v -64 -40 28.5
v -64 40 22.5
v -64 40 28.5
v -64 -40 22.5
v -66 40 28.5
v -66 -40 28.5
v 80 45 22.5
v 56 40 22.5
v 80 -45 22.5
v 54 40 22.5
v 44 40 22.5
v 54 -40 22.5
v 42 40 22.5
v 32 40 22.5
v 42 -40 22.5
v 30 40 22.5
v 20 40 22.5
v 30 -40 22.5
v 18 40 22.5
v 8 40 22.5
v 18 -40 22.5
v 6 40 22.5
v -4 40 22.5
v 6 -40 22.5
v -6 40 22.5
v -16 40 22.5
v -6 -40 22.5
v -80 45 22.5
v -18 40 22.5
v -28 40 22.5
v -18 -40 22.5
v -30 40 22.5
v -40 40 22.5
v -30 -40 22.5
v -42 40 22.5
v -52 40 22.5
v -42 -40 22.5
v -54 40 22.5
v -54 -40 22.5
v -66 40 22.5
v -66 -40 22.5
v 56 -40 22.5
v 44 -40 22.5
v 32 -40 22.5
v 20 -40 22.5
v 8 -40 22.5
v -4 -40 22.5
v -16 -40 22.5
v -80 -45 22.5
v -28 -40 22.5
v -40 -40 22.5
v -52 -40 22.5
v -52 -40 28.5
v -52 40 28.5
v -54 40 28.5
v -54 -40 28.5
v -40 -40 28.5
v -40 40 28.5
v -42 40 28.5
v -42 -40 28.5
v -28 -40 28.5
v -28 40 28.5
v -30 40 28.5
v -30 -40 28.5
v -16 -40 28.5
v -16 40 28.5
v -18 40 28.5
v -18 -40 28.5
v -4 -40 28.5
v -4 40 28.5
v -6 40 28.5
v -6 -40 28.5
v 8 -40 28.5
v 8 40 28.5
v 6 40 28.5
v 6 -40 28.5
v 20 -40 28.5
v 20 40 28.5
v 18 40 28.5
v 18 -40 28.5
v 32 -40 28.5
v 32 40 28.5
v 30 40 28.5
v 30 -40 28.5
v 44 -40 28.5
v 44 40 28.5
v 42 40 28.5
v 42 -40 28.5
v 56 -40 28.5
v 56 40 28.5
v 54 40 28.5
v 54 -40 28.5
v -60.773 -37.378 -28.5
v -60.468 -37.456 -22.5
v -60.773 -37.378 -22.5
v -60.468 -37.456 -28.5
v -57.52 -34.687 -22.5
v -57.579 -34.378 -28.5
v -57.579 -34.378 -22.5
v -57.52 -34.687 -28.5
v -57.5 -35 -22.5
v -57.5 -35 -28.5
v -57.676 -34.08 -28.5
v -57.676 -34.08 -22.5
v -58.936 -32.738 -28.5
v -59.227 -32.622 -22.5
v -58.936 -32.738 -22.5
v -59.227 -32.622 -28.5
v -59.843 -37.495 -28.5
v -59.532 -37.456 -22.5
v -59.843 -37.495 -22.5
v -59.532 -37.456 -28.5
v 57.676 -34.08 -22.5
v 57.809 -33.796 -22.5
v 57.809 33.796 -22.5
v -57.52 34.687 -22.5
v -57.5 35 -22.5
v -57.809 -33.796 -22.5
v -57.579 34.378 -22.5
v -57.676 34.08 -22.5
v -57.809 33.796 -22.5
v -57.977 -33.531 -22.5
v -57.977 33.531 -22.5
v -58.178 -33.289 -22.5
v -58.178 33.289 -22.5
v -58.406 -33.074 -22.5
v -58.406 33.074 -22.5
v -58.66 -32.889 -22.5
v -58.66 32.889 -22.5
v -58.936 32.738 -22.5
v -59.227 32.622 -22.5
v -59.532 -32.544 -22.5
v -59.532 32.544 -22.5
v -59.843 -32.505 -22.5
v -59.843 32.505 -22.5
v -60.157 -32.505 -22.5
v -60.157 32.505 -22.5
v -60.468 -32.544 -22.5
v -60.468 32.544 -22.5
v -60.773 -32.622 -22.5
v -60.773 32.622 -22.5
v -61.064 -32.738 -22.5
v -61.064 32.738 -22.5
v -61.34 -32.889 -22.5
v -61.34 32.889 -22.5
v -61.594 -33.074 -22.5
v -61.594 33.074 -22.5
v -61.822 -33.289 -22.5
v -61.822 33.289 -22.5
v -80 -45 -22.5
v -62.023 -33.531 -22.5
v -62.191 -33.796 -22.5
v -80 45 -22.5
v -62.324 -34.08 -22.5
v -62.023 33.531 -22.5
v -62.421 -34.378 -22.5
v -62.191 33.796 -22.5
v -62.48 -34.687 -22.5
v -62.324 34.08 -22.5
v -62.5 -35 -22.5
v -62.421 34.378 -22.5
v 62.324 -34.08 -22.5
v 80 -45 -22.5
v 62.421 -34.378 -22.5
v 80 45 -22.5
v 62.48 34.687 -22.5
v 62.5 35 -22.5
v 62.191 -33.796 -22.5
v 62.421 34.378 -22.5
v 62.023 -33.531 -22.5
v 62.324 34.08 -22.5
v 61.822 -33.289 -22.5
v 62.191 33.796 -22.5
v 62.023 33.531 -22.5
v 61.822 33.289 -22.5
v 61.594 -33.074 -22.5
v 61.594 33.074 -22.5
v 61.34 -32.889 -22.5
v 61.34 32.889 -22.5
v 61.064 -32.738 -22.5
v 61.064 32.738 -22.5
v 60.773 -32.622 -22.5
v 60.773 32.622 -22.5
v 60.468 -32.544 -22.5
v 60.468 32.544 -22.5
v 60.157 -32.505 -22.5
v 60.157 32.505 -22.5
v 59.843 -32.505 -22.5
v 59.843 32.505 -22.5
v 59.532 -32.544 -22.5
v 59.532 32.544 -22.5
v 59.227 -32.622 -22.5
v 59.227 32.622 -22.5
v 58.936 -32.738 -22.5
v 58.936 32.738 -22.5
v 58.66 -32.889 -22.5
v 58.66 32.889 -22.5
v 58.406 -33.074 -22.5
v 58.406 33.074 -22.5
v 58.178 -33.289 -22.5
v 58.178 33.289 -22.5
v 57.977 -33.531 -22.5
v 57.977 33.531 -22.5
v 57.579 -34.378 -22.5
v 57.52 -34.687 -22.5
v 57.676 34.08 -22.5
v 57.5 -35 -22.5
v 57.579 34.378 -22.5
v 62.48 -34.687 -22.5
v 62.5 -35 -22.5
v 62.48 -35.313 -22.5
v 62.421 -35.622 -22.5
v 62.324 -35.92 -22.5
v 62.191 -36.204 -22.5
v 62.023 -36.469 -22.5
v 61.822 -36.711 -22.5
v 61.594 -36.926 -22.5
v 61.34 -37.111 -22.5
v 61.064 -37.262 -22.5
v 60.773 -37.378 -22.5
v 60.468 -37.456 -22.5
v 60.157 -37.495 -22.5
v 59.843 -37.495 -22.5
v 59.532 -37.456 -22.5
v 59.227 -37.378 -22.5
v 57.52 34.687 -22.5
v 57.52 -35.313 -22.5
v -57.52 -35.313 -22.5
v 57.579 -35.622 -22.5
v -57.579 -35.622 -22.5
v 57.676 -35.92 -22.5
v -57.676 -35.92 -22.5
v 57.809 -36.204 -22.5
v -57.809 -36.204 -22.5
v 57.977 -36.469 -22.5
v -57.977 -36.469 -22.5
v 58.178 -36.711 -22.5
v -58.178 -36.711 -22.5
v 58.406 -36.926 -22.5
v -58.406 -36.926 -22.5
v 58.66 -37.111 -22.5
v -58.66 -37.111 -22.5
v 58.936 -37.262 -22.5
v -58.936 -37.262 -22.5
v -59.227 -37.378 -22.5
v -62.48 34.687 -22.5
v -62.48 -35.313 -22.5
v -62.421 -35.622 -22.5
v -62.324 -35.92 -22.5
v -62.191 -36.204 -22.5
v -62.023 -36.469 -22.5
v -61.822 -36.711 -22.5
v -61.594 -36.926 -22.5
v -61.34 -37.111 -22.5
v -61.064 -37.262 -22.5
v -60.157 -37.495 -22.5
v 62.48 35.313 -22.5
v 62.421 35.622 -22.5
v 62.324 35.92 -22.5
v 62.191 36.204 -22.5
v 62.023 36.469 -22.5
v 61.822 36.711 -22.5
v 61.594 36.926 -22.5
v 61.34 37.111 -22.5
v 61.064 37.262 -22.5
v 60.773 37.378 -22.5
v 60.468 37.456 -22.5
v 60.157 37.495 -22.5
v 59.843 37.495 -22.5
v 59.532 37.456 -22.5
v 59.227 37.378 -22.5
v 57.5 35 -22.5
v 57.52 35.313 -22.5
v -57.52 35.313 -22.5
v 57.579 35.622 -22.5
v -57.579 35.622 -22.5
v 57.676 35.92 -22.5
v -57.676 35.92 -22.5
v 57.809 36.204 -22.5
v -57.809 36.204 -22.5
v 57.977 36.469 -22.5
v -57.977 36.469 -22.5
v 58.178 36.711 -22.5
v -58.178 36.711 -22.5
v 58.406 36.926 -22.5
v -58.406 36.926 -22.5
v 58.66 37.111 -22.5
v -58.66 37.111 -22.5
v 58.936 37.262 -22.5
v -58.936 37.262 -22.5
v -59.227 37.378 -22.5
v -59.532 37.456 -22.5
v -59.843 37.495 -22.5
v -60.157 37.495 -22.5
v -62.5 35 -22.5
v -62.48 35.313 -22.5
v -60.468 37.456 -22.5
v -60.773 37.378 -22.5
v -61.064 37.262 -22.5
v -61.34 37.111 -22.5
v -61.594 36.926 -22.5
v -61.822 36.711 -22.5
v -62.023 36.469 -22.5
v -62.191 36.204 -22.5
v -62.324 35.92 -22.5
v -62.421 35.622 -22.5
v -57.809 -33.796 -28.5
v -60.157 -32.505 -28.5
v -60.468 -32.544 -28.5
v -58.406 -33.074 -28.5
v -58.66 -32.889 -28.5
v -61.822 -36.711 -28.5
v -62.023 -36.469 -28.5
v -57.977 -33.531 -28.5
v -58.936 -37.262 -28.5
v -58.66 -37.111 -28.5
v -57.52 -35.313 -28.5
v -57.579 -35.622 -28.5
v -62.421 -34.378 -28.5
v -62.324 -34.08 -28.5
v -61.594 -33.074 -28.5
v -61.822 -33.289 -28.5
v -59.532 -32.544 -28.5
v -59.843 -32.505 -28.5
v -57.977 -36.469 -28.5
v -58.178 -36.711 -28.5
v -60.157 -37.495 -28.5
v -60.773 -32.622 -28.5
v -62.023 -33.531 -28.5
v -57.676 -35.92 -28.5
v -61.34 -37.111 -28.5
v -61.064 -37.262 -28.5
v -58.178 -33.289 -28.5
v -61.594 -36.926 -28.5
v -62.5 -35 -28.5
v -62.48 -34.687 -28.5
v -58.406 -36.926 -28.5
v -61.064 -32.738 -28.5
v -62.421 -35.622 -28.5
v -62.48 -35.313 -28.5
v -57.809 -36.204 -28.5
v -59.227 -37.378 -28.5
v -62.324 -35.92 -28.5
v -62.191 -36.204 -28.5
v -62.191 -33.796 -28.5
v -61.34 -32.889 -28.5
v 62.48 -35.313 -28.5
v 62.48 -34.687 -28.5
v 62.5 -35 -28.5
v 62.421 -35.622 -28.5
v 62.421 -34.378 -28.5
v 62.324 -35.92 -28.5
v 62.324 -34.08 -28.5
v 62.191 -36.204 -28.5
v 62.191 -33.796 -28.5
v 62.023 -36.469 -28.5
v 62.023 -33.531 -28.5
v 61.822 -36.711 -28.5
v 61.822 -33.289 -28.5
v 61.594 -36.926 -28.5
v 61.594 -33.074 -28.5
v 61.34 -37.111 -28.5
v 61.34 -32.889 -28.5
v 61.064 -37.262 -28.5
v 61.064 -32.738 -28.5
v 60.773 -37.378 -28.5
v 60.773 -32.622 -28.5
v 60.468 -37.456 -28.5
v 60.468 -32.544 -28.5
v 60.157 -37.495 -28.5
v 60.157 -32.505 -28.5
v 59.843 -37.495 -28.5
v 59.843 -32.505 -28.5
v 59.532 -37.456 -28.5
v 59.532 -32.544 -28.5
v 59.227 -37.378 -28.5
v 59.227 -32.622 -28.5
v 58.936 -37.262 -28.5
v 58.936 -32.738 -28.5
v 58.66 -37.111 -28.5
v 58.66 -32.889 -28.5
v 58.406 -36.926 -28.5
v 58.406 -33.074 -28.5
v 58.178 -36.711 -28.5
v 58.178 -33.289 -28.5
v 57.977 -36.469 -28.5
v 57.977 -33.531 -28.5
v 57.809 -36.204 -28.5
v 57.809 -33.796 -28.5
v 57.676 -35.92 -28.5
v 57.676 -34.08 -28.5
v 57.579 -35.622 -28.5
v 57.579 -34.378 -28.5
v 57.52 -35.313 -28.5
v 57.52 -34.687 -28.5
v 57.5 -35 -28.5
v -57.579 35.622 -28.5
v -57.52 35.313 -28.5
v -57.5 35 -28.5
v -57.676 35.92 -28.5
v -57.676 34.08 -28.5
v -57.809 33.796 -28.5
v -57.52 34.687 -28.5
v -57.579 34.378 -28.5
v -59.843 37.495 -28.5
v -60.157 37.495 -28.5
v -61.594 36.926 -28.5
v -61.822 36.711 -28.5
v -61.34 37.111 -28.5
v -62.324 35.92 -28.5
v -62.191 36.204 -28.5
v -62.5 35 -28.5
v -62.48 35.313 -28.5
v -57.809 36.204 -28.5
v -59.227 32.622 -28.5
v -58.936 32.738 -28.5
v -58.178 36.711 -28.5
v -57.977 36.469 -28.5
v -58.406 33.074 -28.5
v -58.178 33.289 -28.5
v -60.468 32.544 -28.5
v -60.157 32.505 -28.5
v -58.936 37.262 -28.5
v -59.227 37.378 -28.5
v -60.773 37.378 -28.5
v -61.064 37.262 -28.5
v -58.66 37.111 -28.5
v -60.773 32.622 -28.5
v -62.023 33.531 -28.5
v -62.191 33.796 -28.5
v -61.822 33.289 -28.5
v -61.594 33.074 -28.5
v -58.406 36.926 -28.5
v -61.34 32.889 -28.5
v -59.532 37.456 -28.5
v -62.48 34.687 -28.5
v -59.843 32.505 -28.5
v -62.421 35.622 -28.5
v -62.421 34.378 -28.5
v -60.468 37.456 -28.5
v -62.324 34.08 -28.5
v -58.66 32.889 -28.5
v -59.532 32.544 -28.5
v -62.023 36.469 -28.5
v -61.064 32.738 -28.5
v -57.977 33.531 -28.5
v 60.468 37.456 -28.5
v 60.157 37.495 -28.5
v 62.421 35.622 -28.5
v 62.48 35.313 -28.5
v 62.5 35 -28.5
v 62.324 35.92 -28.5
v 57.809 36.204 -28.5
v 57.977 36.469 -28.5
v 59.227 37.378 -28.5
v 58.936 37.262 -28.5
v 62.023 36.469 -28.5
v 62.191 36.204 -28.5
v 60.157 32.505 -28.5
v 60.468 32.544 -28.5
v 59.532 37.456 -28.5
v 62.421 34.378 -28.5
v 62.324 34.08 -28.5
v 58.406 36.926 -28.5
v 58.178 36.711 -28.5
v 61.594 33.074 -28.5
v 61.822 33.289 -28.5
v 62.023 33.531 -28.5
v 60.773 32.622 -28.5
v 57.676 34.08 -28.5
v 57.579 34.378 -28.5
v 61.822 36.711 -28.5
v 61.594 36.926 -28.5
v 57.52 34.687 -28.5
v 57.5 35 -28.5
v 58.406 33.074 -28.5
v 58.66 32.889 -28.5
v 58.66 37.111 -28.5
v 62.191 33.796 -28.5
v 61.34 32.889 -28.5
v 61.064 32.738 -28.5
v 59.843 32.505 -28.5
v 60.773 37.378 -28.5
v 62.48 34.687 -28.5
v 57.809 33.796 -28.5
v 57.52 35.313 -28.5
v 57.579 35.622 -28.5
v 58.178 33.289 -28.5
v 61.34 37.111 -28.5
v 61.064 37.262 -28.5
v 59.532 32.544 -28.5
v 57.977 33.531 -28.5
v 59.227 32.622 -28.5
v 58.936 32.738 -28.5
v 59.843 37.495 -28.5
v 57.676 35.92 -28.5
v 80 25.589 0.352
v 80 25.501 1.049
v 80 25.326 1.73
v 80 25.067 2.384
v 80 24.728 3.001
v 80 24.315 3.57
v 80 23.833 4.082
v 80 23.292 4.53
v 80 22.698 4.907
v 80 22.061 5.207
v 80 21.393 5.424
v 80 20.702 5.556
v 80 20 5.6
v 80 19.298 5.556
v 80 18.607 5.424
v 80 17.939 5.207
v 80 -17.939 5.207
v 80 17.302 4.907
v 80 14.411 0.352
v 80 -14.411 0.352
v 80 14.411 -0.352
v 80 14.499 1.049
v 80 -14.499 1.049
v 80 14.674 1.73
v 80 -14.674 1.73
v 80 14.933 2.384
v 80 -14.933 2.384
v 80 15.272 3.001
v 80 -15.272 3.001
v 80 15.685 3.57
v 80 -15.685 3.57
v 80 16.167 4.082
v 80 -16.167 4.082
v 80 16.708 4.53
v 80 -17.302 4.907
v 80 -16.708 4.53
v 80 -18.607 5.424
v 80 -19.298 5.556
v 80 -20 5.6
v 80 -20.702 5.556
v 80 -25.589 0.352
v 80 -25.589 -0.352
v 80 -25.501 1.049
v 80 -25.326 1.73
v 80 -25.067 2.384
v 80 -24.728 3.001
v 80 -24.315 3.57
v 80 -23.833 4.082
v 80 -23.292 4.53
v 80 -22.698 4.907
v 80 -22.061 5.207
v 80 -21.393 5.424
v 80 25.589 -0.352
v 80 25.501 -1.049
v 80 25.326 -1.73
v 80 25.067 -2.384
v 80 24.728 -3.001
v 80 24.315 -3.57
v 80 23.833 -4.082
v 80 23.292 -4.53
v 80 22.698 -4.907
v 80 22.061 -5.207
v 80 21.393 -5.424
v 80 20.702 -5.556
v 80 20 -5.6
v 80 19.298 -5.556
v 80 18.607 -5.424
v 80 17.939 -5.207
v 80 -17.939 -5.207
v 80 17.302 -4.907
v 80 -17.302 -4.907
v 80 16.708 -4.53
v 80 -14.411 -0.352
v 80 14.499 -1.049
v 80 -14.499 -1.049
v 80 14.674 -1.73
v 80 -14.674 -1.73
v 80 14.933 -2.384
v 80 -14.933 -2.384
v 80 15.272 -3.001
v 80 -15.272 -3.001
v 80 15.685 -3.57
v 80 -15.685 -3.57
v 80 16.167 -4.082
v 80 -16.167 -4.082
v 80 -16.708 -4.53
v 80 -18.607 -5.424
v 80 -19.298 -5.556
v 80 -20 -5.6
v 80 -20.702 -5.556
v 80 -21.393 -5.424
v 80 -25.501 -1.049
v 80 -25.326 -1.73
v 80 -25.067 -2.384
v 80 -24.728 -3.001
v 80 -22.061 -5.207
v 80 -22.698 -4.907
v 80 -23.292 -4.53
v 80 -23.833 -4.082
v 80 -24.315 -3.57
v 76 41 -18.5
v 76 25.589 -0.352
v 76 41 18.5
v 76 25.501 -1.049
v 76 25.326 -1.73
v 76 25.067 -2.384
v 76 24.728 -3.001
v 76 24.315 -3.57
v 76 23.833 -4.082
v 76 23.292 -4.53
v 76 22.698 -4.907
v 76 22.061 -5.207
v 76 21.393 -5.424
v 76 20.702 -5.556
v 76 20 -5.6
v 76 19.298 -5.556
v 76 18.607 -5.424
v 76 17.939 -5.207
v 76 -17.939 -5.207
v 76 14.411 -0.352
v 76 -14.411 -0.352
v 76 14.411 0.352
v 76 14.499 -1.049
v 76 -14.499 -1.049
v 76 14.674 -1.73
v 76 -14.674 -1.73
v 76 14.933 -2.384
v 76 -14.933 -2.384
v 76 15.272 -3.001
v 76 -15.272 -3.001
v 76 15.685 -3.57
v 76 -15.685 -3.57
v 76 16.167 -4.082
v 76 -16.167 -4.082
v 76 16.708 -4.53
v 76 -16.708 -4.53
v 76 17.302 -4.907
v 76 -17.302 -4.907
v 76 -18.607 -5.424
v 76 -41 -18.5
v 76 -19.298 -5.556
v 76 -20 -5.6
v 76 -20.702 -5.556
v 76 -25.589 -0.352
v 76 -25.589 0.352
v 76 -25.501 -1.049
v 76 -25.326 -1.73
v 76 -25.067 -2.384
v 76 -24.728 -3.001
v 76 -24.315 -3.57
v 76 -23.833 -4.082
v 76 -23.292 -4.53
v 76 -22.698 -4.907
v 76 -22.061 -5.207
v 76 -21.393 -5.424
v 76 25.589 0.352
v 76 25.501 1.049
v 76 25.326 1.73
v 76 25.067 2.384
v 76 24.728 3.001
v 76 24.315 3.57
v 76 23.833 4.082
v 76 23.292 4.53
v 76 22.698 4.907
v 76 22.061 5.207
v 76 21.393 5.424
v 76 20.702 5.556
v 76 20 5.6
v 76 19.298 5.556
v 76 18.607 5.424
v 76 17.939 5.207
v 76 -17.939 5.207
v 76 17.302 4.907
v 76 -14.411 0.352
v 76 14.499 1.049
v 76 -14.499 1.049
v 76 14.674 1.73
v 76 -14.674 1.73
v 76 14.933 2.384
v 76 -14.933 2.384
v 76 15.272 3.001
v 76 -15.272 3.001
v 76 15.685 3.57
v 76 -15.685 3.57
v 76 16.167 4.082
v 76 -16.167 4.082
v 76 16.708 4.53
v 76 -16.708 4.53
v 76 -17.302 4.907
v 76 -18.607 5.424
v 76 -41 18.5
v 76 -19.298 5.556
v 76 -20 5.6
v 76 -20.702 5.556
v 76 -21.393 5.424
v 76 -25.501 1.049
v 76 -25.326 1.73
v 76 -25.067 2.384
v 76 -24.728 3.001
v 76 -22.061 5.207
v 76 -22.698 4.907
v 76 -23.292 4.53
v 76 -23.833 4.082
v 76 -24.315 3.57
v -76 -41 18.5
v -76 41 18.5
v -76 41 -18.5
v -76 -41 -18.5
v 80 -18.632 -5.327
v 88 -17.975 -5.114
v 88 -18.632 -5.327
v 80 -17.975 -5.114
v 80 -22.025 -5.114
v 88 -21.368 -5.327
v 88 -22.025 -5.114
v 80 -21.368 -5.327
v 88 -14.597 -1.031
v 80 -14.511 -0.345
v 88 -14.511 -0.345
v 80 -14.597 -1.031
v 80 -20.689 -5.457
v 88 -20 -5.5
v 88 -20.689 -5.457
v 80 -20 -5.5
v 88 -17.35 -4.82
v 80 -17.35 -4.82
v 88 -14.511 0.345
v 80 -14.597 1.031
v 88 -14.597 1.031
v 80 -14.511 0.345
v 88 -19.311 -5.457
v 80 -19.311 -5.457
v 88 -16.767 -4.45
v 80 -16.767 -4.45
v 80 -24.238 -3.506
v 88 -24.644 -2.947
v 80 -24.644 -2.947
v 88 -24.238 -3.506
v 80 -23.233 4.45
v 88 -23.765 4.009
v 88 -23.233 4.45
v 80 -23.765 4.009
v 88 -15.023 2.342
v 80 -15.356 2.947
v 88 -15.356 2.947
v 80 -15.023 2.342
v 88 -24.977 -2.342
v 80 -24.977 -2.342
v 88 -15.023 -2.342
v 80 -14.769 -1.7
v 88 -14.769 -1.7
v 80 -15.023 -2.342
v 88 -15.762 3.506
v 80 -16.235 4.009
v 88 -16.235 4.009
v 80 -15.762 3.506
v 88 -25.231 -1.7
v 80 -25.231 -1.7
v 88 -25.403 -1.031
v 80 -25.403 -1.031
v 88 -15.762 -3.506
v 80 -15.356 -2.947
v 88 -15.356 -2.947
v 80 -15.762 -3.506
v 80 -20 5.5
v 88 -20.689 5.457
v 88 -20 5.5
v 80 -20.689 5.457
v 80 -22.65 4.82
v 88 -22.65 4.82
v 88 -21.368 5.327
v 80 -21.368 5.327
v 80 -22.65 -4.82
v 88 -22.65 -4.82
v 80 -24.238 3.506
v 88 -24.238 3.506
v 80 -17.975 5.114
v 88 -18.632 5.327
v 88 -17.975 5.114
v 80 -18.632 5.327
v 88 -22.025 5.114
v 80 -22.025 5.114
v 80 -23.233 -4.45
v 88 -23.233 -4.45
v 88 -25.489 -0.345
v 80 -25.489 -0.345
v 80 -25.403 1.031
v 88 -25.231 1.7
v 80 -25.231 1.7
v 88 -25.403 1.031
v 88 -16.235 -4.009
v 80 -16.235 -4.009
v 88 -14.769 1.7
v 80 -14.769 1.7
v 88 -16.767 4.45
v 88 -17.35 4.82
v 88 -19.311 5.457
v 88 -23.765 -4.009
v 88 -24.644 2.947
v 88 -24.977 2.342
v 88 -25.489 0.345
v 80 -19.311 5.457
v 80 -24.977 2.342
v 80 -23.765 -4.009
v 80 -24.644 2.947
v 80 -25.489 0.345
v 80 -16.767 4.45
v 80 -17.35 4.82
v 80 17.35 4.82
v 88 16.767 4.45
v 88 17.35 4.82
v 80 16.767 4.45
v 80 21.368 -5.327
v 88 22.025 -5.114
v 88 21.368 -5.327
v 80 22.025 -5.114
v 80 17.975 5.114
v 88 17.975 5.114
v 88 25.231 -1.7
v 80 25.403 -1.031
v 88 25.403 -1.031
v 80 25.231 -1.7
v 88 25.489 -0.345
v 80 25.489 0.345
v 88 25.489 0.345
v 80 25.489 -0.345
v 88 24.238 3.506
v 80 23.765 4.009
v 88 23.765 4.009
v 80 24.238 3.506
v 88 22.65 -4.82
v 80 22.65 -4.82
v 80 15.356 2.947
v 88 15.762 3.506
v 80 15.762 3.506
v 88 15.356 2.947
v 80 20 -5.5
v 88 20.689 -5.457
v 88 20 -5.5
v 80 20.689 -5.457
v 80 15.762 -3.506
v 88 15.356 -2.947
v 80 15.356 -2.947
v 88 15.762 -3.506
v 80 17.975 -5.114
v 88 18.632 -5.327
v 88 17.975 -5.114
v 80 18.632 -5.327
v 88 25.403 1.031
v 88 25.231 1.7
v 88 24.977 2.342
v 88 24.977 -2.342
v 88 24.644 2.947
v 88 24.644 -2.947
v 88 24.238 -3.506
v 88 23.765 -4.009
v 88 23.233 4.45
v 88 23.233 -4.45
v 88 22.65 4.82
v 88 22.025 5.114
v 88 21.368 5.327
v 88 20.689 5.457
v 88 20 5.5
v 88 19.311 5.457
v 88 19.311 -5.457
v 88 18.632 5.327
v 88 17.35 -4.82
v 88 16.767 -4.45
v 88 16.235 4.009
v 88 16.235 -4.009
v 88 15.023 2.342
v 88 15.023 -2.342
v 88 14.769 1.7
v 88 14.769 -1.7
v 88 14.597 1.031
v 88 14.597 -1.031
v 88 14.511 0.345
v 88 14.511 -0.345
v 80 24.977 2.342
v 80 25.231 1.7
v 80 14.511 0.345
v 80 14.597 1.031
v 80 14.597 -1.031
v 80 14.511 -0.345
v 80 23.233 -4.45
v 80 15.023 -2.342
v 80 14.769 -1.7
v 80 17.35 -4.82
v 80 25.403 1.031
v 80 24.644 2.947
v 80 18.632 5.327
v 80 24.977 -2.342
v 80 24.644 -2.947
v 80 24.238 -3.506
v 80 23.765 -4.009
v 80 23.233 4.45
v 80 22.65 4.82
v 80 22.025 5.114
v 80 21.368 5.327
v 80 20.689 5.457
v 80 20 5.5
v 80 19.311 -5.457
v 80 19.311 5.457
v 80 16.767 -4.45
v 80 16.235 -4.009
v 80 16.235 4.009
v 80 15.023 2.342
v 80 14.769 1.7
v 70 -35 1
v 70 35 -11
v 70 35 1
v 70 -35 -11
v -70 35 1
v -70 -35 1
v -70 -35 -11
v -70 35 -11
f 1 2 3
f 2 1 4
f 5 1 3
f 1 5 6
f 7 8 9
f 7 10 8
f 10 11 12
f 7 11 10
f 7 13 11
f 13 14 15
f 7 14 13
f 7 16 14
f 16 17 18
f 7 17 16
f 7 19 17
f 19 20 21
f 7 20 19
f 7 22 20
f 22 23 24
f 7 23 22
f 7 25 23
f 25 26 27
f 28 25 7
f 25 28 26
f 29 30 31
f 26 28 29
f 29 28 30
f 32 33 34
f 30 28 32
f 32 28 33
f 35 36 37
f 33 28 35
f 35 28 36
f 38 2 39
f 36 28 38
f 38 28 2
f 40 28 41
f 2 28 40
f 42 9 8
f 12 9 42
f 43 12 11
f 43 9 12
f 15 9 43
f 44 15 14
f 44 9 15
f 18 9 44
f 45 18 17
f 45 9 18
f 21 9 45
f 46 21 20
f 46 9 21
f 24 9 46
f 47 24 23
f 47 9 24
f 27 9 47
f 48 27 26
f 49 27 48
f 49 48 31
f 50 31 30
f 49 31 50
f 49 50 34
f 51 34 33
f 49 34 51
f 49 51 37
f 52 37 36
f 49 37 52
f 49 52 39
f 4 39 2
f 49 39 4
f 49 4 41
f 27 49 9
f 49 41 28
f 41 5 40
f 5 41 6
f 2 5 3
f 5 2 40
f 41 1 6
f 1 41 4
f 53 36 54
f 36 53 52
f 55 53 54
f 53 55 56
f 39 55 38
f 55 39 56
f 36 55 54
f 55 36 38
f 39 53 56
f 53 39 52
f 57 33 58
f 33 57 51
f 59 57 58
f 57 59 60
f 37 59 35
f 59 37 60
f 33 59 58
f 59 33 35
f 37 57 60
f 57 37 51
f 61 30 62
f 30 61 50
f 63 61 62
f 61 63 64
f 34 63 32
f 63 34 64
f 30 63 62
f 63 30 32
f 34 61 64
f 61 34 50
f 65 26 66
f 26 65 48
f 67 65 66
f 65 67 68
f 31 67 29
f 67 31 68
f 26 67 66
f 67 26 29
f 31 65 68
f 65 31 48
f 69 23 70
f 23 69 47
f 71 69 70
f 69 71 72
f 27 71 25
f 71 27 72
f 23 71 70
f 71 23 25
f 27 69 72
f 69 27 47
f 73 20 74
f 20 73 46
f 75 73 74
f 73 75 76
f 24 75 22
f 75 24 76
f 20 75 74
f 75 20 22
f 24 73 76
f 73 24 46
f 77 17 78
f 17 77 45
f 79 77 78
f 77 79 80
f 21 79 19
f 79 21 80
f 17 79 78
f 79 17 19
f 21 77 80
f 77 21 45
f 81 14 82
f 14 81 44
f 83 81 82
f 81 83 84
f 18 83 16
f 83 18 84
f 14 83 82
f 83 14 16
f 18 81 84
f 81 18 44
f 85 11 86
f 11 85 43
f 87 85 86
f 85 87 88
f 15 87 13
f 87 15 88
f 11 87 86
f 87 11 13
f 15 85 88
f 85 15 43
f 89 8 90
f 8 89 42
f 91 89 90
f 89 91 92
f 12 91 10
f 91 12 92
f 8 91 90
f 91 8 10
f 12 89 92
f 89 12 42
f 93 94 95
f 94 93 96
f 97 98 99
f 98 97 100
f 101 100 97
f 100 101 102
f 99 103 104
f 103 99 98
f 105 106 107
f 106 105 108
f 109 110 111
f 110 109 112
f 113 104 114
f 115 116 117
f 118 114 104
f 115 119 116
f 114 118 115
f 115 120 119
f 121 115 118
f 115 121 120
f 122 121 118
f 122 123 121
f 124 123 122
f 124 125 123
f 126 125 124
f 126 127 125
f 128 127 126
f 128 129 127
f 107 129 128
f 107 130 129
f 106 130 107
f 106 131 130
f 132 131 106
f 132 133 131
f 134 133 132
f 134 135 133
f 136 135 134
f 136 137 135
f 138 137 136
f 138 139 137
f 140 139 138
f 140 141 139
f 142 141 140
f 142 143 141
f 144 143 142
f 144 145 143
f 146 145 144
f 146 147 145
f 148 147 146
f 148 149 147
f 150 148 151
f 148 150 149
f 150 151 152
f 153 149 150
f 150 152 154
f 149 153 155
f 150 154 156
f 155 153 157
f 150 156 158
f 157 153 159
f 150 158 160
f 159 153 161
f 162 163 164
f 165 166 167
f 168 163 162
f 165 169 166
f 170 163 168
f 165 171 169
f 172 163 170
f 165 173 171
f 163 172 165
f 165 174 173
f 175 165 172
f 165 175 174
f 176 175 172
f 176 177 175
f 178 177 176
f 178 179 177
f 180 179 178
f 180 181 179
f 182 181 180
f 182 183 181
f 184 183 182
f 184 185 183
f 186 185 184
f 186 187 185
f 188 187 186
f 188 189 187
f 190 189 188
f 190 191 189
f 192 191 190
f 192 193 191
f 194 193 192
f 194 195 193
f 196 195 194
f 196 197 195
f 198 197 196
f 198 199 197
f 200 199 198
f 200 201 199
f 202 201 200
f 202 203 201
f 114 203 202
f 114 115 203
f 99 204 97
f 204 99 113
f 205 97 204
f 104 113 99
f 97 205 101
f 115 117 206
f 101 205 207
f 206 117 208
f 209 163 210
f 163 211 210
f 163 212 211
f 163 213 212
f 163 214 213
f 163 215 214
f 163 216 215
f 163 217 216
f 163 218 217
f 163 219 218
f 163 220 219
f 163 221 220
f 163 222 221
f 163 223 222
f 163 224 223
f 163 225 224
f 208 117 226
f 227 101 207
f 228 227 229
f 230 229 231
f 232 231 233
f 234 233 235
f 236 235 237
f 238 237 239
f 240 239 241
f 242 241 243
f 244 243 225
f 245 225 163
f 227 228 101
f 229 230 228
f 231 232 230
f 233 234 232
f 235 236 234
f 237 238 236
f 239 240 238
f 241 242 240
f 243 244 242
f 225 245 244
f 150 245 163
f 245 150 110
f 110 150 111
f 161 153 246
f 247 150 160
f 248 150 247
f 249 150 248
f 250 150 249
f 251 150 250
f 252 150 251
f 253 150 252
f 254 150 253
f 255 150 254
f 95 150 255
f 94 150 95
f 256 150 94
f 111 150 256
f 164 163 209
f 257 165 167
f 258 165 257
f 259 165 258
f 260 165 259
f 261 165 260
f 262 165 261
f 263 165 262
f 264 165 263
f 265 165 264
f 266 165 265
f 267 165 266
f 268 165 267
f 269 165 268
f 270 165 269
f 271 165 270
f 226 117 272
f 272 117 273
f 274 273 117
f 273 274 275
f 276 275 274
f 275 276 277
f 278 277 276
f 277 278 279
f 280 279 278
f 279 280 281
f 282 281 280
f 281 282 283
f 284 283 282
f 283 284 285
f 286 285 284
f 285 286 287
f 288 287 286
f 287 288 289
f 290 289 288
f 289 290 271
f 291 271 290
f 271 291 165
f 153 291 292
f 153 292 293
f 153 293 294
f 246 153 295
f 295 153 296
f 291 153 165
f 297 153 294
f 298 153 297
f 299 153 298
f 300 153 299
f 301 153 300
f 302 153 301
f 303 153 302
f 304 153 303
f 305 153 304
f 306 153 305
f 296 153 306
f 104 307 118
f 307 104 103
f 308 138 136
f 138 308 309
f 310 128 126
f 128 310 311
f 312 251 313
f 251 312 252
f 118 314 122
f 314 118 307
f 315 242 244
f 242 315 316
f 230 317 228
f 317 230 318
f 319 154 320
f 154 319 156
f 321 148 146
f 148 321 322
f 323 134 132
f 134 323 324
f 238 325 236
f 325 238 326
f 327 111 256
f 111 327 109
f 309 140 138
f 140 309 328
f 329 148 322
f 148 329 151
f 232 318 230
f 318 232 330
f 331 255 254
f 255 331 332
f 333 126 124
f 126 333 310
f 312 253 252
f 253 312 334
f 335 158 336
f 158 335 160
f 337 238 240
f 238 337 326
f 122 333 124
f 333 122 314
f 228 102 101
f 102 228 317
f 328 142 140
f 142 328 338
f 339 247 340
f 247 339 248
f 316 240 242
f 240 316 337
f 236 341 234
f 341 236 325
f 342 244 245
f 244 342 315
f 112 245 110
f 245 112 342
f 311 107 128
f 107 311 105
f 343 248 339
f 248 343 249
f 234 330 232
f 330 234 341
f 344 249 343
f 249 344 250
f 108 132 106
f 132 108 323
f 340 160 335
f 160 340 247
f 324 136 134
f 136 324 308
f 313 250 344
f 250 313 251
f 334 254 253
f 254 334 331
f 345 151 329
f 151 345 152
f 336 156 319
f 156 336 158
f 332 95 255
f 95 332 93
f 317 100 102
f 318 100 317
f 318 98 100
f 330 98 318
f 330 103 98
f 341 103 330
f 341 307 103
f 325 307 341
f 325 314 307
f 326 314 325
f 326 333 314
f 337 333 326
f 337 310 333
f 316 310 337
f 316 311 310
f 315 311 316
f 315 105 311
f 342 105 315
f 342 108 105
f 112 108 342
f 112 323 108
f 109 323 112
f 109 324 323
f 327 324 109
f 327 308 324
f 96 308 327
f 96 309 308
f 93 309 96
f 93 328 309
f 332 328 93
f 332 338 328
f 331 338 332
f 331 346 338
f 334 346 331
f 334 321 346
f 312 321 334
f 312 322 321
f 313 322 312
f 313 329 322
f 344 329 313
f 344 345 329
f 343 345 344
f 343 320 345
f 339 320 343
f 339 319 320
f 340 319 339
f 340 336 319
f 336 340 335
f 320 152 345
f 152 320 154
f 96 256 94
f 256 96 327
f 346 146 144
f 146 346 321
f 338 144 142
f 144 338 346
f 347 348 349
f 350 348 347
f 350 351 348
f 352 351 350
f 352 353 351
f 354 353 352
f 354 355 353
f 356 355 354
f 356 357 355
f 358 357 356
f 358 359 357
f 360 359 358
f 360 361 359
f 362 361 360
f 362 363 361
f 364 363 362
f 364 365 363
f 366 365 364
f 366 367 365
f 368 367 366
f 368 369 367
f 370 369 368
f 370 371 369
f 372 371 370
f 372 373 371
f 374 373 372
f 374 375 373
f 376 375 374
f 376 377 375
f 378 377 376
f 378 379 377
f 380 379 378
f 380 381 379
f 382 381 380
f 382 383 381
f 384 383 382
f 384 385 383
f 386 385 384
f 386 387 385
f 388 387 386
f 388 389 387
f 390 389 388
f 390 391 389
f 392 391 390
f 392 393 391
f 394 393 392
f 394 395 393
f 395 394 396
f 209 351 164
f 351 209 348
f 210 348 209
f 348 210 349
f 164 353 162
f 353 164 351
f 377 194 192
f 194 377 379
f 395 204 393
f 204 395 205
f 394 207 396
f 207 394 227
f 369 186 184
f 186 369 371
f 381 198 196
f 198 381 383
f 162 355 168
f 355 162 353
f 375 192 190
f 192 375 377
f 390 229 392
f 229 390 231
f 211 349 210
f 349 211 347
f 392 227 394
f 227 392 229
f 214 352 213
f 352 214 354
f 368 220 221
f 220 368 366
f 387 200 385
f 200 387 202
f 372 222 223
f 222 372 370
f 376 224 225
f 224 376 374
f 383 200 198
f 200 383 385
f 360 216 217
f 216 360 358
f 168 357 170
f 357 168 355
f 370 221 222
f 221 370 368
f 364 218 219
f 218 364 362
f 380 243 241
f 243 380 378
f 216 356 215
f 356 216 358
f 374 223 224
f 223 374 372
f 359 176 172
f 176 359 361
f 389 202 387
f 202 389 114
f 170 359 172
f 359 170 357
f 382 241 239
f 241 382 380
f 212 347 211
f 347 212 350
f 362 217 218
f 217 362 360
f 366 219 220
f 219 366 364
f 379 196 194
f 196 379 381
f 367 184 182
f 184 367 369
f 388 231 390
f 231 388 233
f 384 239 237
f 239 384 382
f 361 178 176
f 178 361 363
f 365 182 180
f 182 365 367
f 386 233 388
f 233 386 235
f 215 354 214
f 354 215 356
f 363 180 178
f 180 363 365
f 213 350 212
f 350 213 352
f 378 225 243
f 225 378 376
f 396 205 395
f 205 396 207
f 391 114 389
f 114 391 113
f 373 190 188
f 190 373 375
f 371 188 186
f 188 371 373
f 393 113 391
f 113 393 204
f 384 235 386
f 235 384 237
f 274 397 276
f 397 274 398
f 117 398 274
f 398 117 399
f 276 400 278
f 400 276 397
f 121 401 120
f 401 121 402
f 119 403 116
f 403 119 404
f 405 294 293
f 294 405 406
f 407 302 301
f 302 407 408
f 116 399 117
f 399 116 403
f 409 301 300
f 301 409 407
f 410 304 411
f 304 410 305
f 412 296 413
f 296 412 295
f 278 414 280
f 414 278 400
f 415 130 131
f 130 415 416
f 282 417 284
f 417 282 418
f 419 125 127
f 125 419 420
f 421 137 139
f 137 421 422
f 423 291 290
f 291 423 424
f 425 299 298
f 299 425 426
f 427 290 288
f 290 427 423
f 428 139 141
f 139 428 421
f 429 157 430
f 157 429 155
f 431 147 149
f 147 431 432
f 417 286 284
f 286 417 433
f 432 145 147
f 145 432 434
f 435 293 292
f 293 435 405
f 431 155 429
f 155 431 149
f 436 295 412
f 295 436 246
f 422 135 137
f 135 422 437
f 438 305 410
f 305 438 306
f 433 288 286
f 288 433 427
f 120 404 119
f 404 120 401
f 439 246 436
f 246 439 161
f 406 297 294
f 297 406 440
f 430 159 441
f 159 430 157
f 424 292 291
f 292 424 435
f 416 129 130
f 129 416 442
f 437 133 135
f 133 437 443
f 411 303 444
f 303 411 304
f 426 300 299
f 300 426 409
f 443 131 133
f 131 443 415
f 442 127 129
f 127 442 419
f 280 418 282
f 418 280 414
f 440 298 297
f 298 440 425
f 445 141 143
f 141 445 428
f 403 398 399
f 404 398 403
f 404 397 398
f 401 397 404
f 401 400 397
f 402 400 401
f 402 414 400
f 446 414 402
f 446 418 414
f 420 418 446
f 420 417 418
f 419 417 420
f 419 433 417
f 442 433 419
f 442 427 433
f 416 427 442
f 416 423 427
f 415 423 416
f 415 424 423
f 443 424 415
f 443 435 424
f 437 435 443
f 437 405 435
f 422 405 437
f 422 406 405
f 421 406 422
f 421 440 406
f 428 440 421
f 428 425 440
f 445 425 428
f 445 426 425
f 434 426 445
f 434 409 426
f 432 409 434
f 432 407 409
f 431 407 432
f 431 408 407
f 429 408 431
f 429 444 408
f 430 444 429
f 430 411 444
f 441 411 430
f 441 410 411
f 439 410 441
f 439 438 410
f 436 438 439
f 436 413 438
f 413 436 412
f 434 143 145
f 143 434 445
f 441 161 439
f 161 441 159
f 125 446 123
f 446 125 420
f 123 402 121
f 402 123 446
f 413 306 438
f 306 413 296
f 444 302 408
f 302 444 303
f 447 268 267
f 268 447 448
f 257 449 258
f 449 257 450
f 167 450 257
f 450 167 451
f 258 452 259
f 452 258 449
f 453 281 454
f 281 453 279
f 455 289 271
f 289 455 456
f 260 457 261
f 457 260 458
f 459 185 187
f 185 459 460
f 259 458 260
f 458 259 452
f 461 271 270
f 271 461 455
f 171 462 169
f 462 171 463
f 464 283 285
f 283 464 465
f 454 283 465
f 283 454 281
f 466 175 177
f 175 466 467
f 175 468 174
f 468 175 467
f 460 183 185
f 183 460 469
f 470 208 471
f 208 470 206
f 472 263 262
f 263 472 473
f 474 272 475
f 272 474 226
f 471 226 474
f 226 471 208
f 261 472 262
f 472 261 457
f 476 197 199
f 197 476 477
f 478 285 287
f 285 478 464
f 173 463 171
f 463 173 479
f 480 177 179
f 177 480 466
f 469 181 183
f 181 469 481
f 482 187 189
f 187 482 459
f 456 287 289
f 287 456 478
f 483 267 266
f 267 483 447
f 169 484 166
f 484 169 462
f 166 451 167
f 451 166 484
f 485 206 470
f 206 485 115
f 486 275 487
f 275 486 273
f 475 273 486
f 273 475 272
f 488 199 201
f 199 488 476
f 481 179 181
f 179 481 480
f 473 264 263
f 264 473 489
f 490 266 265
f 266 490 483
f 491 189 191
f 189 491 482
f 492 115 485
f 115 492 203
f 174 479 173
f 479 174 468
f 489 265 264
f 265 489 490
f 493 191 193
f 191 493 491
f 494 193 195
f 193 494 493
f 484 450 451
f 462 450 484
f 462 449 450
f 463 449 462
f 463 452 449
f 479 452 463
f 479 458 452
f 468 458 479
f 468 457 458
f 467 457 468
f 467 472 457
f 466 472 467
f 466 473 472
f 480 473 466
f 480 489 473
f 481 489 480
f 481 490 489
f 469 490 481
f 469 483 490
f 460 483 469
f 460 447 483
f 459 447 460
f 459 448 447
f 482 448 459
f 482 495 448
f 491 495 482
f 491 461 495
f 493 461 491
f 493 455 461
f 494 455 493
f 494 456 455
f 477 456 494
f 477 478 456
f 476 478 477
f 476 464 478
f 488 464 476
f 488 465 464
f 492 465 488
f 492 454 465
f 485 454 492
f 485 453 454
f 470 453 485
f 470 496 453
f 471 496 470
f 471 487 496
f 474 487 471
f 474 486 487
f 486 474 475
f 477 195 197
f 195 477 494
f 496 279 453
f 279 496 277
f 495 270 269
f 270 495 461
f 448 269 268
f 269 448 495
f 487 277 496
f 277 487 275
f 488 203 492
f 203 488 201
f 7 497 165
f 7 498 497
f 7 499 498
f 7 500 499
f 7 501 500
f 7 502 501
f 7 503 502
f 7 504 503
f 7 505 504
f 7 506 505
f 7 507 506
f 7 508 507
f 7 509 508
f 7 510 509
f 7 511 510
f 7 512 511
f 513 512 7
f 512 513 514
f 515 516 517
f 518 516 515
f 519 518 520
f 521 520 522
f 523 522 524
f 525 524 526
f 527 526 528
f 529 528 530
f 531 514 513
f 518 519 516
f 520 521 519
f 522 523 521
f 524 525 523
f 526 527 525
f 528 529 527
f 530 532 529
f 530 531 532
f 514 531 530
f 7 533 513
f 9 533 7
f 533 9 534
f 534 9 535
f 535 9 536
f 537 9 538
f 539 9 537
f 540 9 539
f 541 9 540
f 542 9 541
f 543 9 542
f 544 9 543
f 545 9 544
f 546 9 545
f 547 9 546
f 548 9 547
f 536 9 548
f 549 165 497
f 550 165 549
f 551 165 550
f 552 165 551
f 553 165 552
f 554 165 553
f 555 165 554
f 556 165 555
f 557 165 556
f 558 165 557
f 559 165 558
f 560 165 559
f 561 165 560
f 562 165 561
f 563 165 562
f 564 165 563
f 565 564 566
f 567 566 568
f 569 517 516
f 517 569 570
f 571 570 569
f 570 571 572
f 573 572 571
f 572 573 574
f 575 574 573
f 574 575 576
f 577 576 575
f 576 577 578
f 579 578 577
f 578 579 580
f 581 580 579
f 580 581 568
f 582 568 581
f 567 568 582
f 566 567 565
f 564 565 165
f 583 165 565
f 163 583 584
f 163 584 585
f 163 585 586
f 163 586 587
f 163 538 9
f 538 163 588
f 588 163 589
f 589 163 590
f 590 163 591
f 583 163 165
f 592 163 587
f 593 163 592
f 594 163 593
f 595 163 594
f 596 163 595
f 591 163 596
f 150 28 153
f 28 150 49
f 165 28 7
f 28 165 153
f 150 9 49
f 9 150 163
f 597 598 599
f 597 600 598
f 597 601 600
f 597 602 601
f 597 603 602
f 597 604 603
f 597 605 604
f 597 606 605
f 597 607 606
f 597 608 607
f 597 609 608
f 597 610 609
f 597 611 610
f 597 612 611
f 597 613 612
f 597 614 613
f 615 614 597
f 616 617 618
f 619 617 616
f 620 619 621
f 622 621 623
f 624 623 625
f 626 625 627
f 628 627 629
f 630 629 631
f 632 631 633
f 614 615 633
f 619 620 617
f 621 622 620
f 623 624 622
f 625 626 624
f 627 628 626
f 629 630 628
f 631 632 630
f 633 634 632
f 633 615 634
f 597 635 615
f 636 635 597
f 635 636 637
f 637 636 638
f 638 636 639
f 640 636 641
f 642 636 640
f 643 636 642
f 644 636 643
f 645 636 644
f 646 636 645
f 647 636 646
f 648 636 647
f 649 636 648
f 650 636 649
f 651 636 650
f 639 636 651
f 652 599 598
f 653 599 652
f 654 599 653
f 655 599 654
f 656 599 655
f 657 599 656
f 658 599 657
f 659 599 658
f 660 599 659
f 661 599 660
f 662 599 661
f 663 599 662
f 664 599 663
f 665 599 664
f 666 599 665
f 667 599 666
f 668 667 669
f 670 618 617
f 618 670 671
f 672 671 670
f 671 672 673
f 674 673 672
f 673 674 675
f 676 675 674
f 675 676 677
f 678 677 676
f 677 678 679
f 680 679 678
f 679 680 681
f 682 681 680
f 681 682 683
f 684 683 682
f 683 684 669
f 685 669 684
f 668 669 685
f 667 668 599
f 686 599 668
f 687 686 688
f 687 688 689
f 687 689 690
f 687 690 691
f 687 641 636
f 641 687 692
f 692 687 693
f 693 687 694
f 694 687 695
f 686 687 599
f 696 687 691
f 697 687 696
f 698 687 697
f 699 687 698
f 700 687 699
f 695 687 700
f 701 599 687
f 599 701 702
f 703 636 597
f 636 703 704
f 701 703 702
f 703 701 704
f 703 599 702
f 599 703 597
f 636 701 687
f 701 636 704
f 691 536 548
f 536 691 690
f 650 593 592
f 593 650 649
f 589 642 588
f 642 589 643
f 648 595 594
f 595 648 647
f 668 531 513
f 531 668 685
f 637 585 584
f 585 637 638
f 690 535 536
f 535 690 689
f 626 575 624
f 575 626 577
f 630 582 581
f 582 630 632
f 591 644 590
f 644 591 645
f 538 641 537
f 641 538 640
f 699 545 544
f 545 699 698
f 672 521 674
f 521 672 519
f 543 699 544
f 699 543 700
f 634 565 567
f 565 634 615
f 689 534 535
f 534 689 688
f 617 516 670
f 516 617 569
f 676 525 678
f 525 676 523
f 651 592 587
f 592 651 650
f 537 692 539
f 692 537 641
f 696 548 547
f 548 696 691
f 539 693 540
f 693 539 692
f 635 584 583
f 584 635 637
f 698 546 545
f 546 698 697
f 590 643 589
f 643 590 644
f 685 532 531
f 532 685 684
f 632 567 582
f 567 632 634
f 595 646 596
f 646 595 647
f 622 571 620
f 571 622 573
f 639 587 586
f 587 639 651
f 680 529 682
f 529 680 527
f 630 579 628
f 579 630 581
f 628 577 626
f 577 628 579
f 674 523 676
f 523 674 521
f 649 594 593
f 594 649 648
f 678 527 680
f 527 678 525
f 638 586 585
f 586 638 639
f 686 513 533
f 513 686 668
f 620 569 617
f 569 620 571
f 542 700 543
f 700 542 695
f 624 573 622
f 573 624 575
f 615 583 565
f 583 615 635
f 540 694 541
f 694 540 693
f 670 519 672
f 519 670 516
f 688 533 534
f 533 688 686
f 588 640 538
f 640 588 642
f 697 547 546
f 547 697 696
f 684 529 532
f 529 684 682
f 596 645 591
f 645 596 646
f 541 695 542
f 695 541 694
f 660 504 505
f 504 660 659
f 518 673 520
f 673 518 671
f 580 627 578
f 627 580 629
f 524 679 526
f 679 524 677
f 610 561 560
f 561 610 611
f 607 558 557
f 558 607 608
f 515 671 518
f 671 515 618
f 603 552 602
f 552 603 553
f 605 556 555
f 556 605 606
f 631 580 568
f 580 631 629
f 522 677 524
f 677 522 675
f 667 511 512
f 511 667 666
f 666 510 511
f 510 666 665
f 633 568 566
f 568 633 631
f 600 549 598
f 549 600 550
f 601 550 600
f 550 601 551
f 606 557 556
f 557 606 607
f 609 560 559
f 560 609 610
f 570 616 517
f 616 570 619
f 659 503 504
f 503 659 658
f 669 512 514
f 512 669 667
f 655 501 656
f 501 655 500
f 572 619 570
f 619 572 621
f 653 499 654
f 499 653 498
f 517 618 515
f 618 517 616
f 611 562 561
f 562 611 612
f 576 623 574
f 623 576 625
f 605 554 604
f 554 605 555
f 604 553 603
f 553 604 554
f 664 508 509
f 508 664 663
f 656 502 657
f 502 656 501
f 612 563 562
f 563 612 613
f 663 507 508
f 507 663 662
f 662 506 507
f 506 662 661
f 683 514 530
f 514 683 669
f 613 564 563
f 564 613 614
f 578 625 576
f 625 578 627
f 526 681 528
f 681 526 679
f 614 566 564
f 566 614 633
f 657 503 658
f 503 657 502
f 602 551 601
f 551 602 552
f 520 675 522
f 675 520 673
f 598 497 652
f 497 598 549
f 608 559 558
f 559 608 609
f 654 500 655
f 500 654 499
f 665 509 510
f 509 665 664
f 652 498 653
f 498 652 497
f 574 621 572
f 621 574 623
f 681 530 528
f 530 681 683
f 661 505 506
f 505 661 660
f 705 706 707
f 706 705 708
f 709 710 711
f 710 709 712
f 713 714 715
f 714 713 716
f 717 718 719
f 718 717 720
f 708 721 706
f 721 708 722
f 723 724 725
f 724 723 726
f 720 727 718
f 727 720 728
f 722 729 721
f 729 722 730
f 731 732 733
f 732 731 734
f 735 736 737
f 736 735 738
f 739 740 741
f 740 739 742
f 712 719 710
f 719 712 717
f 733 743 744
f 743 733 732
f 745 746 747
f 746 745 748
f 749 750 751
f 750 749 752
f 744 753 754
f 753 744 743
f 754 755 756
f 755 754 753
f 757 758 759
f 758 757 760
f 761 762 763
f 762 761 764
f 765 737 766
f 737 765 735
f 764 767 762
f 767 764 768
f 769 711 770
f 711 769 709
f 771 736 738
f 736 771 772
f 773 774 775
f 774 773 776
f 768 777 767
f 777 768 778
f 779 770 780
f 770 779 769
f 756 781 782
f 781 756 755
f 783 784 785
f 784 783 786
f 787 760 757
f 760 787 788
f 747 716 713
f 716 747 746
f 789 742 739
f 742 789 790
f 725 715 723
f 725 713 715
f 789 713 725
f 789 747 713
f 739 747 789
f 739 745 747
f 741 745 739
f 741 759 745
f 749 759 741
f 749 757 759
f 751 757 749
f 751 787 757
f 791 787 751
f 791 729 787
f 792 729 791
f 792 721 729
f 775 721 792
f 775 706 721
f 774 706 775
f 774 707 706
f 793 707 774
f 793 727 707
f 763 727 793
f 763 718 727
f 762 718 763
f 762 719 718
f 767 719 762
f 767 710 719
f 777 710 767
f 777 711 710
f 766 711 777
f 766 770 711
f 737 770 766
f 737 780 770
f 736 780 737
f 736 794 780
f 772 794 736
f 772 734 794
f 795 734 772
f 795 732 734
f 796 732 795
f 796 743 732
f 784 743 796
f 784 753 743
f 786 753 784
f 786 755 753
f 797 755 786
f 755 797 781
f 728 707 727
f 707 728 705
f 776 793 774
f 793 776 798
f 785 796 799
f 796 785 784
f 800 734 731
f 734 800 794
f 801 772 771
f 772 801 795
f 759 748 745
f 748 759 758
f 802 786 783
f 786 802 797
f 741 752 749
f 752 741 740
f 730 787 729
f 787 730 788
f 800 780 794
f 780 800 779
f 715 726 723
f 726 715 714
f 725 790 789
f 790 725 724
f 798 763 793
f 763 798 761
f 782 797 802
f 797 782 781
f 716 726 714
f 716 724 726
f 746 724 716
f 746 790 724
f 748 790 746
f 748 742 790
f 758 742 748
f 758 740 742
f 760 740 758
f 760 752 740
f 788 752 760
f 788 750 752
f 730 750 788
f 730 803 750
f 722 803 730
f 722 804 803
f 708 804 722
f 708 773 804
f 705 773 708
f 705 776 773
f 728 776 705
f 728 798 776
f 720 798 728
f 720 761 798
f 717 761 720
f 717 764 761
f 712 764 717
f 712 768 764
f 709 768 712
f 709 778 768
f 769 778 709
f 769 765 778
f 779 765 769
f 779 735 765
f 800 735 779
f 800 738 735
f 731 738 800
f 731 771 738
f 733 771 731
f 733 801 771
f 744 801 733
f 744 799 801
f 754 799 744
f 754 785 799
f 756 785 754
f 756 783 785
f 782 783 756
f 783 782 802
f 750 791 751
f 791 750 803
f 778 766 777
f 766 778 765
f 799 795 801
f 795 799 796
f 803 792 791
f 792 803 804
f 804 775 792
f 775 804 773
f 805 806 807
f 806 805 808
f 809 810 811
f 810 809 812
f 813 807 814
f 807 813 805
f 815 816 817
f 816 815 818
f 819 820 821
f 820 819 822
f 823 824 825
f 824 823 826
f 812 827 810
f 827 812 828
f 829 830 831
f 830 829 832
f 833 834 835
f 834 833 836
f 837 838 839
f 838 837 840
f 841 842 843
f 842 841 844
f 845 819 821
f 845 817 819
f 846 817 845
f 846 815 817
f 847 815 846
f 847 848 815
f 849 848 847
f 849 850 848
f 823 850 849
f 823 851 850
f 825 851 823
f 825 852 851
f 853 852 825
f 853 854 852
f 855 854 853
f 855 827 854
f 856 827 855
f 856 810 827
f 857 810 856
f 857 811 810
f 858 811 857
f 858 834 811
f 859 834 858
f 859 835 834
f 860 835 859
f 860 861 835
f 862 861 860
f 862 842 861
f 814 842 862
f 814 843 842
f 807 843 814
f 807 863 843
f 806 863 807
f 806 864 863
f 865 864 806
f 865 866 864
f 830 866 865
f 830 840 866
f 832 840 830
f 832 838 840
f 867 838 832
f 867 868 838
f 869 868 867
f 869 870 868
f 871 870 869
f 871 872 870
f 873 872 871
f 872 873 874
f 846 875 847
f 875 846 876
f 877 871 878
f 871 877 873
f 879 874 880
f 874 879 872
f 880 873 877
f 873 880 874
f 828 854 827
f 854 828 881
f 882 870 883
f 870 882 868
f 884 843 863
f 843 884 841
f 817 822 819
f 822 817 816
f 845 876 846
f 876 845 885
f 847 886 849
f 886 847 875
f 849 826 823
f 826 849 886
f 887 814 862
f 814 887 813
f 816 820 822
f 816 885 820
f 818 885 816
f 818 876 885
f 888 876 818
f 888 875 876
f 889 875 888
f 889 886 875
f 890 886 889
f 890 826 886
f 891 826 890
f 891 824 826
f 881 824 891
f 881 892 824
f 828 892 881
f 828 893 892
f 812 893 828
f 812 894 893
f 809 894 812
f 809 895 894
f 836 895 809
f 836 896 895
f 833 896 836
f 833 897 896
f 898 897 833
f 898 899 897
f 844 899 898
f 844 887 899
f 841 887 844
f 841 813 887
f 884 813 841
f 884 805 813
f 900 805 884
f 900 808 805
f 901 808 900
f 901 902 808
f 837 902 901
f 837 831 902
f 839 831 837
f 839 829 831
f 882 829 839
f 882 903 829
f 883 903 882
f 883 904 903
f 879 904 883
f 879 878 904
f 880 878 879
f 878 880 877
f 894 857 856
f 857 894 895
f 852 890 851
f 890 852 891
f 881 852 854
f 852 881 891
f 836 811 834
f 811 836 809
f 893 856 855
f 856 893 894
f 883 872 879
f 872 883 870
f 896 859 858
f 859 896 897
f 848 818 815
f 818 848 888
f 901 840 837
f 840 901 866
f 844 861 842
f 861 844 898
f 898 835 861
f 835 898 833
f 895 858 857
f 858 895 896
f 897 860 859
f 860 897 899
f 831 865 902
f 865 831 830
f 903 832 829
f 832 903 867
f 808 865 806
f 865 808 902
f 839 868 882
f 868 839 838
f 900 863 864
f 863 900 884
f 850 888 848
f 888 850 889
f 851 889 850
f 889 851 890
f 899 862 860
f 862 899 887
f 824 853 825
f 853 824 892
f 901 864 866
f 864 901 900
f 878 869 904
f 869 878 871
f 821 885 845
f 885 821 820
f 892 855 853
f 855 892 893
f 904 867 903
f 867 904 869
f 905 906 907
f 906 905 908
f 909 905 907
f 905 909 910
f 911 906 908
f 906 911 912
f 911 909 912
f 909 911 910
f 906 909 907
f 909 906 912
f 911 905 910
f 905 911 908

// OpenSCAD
// ========================================================
// F-14F RETROFIT KIT - COCKPIT TACTICAL SATELLITE MODULE
// HIGH-PERFORMANCE SATCOM TRANSEIVER TOWER UPGRADE
// ========================================================

$fn = 50; // Precision render interpolation for RF coax ports

// --- SATCOM MODULE LAYOUT CONSTANTS (mm) ---
// Form-factored to match the exact top profile of the cockpit floor power block
sat_length = 160; 
sat_width  = 90;  
sat_height = 45;  
wall_thick = 4.0; // Mil-spec weatherproofing wall depth

// --- COLOR PALETTE ---
anodized_navy  = [0.12, 0.22, 0.35, 1.0]; // Non-reflective tactical blue finish
gold_rf_shield = [0.88, 0.72, 0.24, 0.4]; // Internally shielded RF processing dome
coax_silver    = [0.82, 0.84, 0.86, 1.0]; // High-frequency external TNC antenna ports
power_pins     = [0.93, 0.83, 0.32, 1.0]; // Direct-coupling basement power contacts

// ========================================================
// MECHANICAL COMPONENT GENERATION
// ========================================================

module satcom_transceiver_assembly() {
    // 1. Reference View: Internal Dual-Mode RF Core Base Substrate
    color(gold_rf_shield)
        translate([0, 0, -5])
        cube([sat_length - 20, sat_width - 20, 12], center=true);

    // 2. Main Weatherproof External Enclosure Chassis Shell
    difference() {
        union() {
            // Main modular block body
            color(anodized_navy) cube([sat_length, sat_width, sat_height], center=true);
            
            // Longitudinal Heat dissipation cooling fins
            color(anodized_navy) {
                for (x_fin = [-sat_length/2 + 15 : 12 : sat_length/2 - 15]) {
                    translate([x_fin, 0, sat_height/2 + 3])
                        cube([2.0, sat_width - 10, 6], center=true);
                }
            }
            
            // --- DROP-IN MATCH: Basement Alignment Interlock Alignment Dowels ---
            // Snaps directly into the underlying cockpit power block screws for stack configuration
            color([0.4, 0.4, 0.4]) {
                translate([-60, -35, -sat_height/2 - 3]) cylinder(d=5, h=6, center=true);
                translate([60,  -35, -sat_height/2 - 3]) cylinder(d=5, h=6, center=true);
                translate([-60,  35, -sat_height/2 - 3]) cylinder(d=5, h=6, center=true);
                translate([60,   35, -sat_height/2 - 3]) cylinder(d=5, h=6, center=true);
            }
        }
        
        // Internal data vault containment cavity subtraction
        cube([sat_length - (wall_thick*2), sat_width - (wall_thick*2), sat_height - (wall_thick*2)], center=true);
        
        // Front wall punch-outs for dual TNC external antenna connections (Iridium + Inmarsat paths)
        translate([sat_length/2 + 1, -20, 0]) rotate([0, 90, 0]) cylinder(d=11.2, h=wall_thick * 3, center=true);
        translate([sat_length/2 + 1,  20, 0]) rotate([0, 90, 0]) cylinder(d=11.2, h=wall_thick * 3, center=true);
        
        // Front display diagnostic pinholes for fiber-optic status LEDs
        for (x_led = [-30, 0, 30]) {
            translate([x_led, -sat_width/2 - 1, -10]) rotate() cylinder(d=2.0, h=wall_thick * 3, center=true);
        }
    }
    
    // 3. High-Frequency Threaded TNC Antenna Joint Adapters
    color(coax_silver) {
        translate([sat_length/2 + 4, -20, 0]) rotate([0, 90, 0]) cylinder(d=11.0, h=8, center=true);
        translate([sat_length/2 + 4,  20, 0]) rotate([0, 90, 0]) cylinder(d=11.0, h=8, center=true);
    }
}

// Execute active rendering architecture module
satcom_transceiver_assembly();
